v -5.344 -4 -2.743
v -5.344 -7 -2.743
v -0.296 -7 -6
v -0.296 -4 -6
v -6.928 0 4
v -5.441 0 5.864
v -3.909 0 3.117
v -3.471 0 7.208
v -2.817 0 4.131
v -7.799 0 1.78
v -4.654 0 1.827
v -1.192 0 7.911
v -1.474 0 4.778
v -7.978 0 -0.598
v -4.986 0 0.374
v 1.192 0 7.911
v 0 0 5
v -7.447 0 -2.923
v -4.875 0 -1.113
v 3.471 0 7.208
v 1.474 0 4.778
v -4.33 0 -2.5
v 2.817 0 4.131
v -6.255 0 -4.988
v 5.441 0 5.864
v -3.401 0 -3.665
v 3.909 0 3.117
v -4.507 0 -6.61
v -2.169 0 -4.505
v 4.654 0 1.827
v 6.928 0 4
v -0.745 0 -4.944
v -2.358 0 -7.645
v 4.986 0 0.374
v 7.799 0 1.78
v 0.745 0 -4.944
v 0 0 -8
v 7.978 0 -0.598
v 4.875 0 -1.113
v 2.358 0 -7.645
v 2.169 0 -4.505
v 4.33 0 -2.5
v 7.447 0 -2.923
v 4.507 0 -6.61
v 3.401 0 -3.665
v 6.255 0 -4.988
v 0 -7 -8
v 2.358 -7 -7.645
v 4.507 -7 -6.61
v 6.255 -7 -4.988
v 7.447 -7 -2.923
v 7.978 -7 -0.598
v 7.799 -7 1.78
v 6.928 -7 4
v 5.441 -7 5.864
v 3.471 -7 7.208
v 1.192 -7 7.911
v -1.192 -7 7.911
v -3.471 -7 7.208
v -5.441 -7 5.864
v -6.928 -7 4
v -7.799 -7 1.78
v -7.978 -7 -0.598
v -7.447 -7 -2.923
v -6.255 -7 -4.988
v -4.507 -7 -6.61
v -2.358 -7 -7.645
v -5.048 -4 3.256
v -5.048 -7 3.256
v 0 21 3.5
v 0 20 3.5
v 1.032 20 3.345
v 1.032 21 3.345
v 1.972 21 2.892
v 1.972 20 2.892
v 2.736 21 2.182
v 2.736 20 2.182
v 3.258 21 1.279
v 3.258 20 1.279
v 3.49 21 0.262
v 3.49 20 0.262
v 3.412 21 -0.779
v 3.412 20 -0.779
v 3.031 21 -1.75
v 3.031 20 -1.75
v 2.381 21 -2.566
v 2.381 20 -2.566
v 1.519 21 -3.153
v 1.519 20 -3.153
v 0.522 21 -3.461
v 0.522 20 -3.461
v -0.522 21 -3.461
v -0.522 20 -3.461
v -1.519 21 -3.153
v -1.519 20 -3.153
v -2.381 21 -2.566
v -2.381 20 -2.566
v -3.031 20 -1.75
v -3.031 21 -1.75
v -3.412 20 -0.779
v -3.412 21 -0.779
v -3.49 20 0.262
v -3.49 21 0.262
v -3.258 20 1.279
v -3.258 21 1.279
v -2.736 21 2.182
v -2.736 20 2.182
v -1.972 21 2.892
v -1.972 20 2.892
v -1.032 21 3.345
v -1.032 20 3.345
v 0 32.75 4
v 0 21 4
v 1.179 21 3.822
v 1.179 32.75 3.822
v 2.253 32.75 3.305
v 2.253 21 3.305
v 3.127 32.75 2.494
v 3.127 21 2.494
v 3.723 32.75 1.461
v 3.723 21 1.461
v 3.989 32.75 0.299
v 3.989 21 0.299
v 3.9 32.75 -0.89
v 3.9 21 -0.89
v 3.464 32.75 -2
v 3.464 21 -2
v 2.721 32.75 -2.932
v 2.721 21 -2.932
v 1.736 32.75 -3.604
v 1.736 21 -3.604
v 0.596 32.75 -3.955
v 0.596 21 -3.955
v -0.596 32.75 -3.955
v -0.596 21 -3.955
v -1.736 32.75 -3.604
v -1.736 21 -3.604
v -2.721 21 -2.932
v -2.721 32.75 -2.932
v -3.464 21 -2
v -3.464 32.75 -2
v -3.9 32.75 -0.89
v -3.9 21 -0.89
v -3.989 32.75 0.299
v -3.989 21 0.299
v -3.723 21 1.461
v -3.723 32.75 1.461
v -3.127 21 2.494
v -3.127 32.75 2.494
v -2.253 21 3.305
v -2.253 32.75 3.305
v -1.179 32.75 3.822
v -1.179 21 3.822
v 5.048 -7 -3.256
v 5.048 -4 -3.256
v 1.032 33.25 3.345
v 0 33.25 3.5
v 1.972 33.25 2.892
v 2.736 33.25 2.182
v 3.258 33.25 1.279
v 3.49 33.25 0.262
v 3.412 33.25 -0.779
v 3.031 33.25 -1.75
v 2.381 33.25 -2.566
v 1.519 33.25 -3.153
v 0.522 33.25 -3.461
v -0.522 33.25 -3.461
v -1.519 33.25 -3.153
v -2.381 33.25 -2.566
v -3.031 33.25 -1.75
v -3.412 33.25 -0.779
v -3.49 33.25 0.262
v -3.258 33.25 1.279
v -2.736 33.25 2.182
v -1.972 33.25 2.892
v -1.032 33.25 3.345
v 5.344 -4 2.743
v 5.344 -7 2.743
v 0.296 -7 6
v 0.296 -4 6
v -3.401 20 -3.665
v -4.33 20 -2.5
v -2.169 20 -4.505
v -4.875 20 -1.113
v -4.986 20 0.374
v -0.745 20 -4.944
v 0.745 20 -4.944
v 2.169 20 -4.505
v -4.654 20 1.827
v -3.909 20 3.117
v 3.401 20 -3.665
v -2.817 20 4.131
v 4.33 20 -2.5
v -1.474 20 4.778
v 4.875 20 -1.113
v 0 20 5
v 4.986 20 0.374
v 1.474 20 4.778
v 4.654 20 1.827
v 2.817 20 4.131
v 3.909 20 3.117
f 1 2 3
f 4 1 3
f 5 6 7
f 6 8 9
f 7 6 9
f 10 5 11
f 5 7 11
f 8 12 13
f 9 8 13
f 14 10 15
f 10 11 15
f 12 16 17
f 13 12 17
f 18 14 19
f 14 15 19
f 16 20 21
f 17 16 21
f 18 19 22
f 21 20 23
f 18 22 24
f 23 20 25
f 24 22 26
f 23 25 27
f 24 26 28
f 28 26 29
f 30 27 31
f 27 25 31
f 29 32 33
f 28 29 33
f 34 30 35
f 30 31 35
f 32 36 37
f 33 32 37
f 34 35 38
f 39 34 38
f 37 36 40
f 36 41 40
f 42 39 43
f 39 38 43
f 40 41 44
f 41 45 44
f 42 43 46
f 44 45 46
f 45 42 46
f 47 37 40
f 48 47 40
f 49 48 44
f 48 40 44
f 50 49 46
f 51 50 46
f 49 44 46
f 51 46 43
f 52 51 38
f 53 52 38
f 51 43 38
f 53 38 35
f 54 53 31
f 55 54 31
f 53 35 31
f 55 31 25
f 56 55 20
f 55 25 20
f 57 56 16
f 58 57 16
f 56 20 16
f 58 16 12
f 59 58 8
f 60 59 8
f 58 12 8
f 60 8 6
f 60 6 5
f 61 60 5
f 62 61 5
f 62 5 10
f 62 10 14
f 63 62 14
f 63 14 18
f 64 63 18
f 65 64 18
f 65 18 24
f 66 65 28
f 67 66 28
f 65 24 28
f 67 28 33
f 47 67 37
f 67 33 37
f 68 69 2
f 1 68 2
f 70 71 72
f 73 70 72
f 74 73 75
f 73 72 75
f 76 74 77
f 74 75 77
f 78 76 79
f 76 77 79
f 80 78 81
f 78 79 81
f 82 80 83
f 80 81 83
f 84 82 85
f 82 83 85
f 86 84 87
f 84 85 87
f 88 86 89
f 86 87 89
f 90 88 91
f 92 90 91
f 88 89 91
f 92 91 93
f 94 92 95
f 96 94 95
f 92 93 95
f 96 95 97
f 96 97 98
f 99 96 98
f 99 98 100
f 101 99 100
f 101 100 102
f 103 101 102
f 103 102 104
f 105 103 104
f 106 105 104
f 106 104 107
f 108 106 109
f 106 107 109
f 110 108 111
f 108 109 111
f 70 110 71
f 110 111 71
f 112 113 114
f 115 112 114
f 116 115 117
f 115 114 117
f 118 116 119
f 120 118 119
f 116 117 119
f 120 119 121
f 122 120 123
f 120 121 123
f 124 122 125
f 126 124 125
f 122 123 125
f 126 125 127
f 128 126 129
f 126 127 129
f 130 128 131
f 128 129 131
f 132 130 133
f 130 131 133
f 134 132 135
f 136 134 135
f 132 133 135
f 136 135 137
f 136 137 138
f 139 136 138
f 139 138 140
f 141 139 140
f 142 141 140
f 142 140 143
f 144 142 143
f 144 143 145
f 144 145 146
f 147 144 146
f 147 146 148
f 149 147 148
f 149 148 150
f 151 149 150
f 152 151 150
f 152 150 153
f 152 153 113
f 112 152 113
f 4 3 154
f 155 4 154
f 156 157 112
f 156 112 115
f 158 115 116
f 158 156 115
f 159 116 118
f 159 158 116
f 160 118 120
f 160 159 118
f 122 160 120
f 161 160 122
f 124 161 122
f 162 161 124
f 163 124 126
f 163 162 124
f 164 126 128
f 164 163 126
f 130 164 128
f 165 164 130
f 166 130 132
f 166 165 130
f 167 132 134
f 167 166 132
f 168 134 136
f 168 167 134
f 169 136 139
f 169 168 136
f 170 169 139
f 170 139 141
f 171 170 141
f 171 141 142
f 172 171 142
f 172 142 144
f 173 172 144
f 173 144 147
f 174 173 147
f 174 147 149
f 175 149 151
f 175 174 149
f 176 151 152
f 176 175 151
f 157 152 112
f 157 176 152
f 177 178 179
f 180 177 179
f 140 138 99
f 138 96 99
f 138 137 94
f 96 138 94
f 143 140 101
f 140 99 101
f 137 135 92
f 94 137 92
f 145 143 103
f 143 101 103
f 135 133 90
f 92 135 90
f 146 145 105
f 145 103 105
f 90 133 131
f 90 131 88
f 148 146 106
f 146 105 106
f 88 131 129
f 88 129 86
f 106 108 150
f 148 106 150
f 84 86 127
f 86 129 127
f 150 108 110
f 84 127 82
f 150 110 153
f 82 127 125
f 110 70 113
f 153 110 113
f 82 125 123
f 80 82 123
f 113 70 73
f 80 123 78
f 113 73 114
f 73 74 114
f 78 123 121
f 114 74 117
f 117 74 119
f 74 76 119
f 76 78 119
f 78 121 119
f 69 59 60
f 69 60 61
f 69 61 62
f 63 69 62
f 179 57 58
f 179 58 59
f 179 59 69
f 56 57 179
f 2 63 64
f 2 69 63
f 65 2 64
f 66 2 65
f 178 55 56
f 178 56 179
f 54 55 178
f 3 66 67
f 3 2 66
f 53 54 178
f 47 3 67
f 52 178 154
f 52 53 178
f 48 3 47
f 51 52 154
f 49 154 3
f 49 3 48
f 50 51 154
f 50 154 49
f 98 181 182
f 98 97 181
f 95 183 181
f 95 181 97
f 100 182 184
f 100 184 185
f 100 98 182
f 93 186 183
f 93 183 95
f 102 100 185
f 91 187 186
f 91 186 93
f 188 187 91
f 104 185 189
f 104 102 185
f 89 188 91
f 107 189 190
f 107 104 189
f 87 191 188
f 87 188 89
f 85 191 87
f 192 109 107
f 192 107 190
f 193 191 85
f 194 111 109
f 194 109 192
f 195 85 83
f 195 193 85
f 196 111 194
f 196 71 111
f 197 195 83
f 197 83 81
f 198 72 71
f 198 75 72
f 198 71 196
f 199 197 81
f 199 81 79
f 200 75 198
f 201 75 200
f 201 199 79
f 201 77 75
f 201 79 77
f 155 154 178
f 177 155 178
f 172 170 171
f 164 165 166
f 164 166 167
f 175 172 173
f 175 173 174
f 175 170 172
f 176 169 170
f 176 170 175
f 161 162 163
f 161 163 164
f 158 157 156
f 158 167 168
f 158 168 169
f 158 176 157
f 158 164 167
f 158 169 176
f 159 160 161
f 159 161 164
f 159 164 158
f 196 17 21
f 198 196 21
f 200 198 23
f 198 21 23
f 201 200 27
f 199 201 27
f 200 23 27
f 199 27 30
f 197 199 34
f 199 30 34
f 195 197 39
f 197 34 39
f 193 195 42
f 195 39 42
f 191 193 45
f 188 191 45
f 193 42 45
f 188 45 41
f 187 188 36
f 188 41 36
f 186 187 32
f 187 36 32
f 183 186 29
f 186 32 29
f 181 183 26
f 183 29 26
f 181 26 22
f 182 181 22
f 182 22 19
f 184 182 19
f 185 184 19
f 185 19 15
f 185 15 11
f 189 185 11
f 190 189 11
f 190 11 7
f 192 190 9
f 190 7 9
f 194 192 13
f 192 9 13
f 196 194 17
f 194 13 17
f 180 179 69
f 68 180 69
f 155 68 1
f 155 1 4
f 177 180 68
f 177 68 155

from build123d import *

# Parameters (mm, degrees)
SKETCH_2_R          = 5
EXTRUDE_1_DEPTH     = 20
SKETCH_3_R          = 8
EXTRUDE_2_DEPTH     = 7
SKETCH_4_R          = 4
EXTRUDE_3_DEPTH     = 13.25
CUT_EXTRUDE_1_DEPTH = 3
CHAMFER_1_SIZE      = 0.5
SKETCH_6_R          = 4
SKETCH_6_R_2        = 3.5
CUT_EXTRUDE_2_DEPTH = 1


with BuildPart() as part:
    # 草图2 → 凸台-拉伸1 (new body)
    with BuildSketch(Plane(origin=(0, 0, 0), x_dir=(1, 0, 0), z_dir=(0, 1, 0))):
        with Locations(Location((0, 0, 0), (0, 0, 270))):
            Circle(SKETCH_2_R)
    extrude(amount=EXTRUDE_1_DEPTH)

    # 草图3 → 凸台-拉伸2 (add)
    with BuildSketch(Plane.XZ):
        with Locations(Location((0, 0, 0), (0, 0, 270))):
            Circle(SKETCH_3_R)
    extrude(amount=EXTRUDE_2_DEPTH)

    # 草图4 → 凸台-拉伸3 (add)
    with BuildSketch(Plane(origin=(0, 20, 0), x_dir=(1, 0, 0), z_dir=(0, 1, 0))):
        with Locations(Location((0, 0, 0), (0, 0, 270))):
            Circle(SKETCH_4_R)
    extrude(amount=EXTRUDE_3_DEPTH)

    # 草图5 → 切除-拉伸1 (cut)
    with BuildSketch(Plane.XZ.offset(7)):
        Polygon((0.295951976, 5.999509568), (-5.047751708, 3.256056713), (-5.343703684, -2.743452854), (-0.295951976, -5.999509568), (5.047751708, -3.256056713), (5.343703684, 2.743452854), align=None)
    extrude(amount=-CUT_EXTRUDE_1_DEPTH, mode=Mode.SUBTRACT)

    # 倒角1
    chamfer_1_edges = [part.edges().sort_by_distance(p)[0] for p in [
        (0, 33.25, -4),
    ]]
    chamfer(chamfer_1_edges, length=CHAMFER_1_SIZE)

    # 草图6 → 切除-拉伸2 (cut)
    with BuildSketch(Plane(origin=(0, 20, 0), x_dir=(1, 0, 0), z_dir=(0, 1, 0))):
        with Locations(Location((0, 0, 0), (0, 0, 270))):
            Circle(SKETCH_6_R)
        with Locations(Location((0, 0, 0), (0, 0, 270))):
            Circle(SKETCH_6_R_2, mode=Mode.SUBTRACT)
    extrude(amount=CUT_EXTRUDE_2_DEPTH, mode=Mode.SUBTRACT)


solid = part.part
